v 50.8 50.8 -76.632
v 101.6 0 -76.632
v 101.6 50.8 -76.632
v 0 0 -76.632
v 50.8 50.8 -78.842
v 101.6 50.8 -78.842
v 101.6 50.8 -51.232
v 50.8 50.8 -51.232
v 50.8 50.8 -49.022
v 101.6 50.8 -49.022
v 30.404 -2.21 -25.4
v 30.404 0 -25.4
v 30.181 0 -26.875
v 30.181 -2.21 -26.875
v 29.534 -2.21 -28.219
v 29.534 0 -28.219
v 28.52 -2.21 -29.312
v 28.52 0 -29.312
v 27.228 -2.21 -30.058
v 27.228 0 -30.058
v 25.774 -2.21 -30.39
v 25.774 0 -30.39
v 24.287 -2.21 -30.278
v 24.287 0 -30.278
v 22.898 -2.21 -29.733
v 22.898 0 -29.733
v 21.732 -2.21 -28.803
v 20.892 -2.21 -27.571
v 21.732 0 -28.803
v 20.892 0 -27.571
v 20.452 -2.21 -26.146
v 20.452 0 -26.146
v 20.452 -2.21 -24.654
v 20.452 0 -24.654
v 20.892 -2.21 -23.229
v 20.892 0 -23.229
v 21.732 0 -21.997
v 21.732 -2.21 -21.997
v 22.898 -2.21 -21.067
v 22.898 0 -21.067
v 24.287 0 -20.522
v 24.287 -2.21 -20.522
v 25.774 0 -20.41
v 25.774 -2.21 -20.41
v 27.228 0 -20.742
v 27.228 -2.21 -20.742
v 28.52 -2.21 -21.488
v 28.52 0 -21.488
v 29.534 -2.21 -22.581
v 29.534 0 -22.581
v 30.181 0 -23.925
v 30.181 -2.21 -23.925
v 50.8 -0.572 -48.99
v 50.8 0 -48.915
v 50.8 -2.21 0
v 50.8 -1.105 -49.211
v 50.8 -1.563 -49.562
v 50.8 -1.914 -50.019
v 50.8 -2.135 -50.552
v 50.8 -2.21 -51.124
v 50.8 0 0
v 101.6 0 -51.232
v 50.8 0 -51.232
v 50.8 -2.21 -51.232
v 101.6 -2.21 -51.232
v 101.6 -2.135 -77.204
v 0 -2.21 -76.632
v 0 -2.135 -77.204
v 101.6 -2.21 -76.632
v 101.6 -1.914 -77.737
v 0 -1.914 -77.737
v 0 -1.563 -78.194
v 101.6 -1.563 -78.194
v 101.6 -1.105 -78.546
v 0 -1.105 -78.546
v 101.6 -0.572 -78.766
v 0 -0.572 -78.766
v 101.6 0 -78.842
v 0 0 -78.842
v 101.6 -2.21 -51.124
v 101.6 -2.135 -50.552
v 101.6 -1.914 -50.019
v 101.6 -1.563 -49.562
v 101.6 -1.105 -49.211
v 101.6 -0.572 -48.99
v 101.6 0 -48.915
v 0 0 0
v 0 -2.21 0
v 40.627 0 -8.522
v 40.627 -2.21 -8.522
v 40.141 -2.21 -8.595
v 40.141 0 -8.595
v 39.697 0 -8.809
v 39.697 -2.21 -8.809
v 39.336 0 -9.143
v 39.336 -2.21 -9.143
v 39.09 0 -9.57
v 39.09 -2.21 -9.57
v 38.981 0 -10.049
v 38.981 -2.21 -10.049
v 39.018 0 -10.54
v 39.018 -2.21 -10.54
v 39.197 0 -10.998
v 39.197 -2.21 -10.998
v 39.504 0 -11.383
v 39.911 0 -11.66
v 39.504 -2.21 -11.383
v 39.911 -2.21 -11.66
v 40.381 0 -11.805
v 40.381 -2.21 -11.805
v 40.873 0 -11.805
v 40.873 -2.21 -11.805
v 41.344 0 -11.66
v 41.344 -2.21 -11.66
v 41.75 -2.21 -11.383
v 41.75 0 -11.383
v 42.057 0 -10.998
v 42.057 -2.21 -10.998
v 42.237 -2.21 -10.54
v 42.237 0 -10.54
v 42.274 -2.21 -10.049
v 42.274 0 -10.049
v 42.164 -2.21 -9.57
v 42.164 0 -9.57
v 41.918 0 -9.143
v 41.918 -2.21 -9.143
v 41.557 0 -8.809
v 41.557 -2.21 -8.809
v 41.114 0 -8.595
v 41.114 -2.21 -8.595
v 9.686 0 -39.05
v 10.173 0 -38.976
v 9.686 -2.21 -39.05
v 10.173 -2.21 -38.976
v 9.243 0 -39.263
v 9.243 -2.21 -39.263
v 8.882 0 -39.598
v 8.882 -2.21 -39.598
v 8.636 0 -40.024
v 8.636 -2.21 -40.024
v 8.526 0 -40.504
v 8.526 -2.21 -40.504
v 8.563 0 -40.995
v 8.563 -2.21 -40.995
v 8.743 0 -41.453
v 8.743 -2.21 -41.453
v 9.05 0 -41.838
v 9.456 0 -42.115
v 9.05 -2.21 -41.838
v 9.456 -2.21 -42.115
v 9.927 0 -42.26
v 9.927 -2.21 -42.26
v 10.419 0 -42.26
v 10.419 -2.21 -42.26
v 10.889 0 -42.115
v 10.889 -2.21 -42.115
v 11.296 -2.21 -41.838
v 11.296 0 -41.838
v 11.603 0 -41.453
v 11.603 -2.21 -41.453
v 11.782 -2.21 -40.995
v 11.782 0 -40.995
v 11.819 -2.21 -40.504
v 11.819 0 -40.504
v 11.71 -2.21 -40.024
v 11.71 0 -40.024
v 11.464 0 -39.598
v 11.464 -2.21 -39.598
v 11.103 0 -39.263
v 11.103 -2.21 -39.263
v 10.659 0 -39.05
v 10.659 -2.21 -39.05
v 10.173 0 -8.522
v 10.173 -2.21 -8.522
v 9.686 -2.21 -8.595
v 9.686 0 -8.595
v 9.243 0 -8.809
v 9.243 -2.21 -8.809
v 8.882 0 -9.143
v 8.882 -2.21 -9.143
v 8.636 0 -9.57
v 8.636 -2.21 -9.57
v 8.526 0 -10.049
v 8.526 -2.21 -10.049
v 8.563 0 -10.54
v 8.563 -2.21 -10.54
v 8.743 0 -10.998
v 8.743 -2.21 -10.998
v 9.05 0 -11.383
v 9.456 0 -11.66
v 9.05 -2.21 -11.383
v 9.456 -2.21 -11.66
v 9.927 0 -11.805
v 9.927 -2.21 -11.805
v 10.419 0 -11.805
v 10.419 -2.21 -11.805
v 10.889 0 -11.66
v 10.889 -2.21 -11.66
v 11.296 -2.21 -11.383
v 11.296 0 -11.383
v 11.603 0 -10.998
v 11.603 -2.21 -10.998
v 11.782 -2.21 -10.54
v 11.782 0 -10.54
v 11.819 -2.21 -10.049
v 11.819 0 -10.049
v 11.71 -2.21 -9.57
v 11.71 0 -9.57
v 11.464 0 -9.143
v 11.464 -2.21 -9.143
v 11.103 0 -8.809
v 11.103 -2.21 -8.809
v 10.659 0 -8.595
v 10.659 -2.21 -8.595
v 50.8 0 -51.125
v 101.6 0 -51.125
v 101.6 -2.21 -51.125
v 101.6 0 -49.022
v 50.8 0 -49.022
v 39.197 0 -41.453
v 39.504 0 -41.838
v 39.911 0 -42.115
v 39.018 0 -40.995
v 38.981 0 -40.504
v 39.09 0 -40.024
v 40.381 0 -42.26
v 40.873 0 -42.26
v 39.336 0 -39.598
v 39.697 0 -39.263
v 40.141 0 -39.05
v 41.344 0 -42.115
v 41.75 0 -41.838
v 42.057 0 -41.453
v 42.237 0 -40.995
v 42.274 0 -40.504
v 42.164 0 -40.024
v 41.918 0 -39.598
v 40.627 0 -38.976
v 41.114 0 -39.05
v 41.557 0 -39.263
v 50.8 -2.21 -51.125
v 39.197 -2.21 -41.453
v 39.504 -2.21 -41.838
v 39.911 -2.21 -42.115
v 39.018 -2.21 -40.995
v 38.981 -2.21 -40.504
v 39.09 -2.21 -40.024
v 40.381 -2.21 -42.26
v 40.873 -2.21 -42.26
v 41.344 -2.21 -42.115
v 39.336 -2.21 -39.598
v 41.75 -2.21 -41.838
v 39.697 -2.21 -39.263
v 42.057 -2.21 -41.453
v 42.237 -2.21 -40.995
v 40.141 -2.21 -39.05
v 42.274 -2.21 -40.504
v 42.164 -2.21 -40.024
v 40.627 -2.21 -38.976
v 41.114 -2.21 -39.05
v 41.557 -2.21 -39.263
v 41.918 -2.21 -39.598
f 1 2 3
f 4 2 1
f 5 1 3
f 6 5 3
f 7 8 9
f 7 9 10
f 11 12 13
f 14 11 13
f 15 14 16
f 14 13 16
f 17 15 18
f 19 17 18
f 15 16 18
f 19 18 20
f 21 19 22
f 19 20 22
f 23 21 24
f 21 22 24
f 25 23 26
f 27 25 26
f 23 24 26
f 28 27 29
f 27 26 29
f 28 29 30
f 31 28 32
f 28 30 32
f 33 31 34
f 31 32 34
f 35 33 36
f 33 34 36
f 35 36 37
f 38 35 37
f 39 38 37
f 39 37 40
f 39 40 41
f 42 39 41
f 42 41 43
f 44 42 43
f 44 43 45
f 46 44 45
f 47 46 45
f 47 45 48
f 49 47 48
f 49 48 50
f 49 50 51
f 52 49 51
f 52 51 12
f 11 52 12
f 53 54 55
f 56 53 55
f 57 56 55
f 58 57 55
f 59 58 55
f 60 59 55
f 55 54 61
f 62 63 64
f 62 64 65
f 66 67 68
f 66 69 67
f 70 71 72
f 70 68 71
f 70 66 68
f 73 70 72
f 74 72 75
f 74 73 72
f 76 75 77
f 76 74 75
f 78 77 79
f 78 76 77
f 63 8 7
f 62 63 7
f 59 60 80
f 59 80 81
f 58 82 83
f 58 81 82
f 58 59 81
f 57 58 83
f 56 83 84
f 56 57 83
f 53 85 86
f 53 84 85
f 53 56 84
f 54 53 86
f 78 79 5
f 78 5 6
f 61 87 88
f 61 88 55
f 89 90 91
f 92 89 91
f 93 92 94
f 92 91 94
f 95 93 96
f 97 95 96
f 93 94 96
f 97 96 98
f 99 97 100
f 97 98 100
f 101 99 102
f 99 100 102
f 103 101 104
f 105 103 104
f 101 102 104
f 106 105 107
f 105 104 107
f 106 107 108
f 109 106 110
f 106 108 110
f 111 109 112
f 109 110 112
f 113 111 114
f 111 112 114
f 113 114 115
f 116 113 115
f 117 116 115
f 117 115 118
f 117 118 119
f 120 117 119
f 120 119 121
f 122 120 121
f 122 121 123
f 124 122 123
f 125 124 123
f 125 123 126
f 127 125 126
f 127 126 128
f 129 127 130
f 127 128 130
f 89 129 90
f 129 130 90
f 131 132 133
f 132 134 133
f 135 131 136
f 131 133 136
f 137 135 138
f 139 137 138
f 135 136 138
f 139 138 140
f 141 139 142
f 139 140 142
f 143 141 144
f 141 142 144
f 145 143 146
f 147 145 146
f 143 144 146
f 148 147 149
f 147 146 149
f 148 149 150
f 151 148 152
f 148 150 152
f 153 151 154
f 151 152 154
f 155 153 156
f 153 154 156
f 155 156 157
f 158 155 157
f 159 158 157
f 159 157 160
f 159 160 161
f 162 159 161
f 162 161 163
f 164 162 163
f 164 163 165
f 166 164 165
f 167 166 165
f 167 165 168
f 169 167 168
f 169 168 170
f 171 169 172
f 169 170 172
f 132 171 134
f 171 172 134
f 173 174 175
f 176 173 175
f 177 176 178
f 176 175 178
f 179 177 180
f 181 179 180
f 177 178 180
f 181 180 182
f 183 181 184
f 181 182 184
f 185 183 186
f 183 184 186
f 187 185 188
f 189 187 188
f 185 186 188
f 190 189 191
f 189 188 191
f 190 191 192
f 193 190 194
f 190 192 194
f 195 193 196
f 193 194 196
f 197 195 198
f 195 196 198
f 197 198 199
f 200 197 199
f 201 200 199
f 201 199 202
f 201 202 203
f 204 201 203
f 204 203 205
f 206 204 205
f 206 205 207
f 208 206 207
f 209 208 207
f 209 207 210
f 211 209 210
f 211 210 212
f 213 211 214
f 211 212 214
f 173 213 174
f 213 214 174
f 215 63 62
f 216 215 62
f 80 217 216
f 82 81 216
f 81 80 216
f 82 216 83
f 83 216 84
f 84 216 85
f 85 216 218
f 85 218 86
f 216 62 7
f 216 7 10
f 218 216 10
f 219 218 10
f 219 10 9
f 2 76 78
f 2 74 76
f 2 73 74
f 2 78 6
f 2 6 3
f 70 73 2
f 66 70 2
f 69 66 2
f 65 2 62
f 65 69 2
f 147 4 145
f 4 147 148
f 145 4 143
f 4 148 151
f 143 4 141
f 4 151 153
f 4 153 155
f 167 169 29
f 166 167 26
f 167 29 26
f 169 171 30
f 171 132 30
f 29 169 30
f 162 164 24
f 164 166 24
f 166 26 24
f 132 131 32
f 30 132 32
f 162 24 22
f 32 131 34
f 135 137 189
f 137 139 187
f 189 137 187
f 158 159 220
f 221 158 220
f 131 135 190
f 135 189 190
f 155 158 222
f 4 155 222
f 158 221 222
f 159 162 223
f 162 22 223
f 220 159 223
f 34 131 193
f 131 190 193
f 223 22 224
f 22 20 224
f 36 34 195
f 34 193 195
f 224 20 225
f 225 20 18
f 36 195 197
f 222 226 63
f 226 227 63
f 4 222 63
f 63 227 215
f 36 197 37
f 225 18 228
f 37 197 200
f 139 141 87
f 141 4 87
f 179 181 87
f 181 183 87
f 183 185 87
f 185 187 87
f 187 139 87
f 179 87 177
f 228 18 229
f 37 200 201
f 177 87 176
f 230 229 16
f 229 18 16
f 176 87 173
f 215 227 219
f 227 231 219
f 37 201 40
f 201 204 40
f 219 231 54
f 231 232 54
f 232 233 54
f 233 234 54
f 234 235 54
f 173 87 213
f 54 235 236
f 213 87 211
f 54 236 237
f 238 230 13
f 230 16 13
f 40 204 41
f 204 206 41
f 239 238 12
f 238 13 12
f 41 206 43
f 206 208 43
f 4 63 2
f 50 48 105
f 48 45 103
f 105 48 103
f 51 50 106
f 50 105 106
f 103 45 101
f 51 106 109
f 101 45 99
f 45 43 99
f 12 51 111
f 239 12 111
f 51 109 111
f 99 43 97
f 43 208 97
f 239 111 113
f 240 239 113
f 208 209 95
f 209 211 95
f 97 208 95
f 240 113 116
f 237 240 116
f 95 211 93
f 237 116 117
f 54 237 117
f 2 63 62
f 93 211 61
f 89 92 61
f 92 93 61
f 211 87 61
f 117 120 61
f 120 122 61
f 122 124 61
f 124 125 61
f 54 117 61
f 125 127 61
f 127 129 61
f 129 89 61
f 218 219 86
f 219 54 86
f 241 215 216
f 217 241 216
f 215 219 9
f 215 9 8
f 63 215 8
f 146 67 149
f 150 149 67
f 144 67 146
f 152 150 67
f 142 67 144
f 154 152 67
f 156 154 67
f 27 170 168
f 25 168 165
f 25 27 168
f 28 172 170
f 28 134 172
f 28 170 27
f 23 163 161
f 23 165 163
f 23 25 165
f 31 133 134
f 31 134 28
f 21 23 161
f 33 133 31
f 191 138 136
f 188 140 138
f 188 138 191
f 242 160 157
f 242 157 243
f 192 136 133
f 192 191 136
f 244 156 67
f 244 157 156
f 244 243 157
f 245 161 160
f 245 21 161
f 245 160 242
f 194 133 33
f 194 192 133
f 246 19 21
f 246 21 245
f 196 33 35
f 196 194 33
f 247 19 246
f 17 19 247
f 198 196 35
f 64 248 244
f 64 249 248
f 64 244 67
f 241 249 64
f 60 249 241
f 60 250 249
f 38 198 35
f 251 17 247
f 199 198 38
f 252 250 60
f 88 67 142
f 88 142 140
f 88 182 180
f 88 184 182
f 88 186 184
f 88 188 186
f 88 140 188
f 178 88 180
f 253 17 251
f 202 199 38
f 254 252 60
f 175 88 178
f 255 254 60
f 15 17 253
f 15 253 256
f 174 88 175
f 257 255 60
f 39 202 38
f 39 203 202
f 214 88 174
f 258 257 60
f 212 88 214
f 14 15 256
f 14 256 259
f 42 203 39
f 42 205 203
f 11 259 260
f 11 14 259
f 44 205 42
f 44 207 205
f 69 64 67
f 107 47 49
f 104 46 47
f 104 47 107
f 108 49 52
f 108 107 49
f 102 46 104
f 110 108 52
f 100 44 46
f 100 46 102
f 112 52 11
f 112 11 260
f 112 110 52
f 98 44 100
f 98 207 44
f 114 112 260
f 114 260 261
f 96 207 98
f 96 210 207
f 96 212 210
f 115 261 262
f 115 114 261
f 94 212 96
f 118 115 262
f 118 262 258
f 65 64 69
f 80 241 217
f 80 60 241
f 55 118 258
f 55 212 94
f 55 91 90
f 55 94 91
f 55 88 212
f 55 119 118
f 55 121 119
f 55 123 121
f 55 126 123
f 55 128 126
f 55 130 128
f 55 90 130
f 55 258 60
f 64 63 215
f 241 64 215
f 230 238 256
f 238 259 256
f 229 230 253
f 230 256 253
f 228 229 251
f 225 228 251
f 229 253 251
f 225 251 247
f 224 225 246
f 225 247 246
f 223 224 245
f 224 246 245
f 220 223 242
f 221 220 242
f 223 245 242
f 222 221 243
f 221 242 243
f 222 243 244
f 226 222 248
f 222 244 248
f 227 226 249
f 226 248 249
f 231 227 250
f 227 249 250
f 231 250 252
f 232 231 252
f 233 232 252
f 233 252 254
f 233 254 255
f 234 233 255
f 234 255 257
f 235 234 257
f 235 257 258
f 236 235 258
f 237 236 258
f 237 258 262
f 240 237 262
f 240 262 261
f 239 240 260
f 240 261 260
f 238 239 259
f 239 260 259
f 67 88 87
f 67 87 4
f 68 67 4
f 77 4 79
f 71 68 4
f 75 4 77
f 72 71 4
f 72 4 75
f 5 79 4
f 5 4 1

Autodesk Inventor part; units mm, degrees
ref_plane "YZ Plane" through (0, 0, 0) normal (1, 0, 0) x (0, 1, 0)
ref_plane "XZ Plane" through (0, 0, 0) normal (0, 1, 0) x (-1, 0, 0)
ref_plane "XY Plane" through (0, 0, 0) normal (0, 0, 1) x (1, 0, 0)
sketch "Sketch1" plane through (0, 0, 0) normal (0, 1, 0) x (-1, 0, 0)
  line L0 (0, 0) -> (-50.8, 0)
  line L1 (-50.8, 0) -> (-50.8, -50.8)
  line L2 (-50.8, -50.8) -> (0, -50.8)
  line L3 (0, -50.8) -> (0, 0)
  line L4 (-50.8, 0) -> (-101.6, 0)
  line L5 (-101.6, 0) -> (-101.6, -25.4)
  line L6 (-101.6, -25.4) -> (-50.8, -25.4)
  line L7 (-50.8, -25.4) -> (-50.8, 0)
  line L8 (-50.8, 0) -> (-101.6, 0)
  line L9 (-101.6, 0) -> (-101.6, 2.2098)
  line L10 (-101.6, 2.2098) -> (-50.8, 2.2098)
  line L11 (-50.8, 2.2098) -> (-50.8, 0)
  dimension "d0" = 50.8
  dimension "d1" = 50.8
  dimension "d2" = 50.8
  dimension "d3" = 2.2098
extrude "Extrusion1" add sketch "Sketch1" against normal blind 2.2098
extrude "Extrusion2" add sketch "Sketch1" along normal blind 50.8 contours L4 L9 L10 L11
fillet "Fillet1" radius 2.2098 1 edges at (76.2, -2.2098, 2.2098)
sketch "Sketch2" plane through (0, 0, 0) normal (0, 1, 0) x (1, 0, 0)
  line L0 (50.8, 0) -> (101.6, 0) projected
  line L1 (101.6, 0) -> (101.6, 25.4) projected
  line L2 (101.6, 25.4) -> (50.8, 25.4) projected
  line L3 (50.8, 25.4) -> (50.8, 50.8) projected
  line L4 (50.8, 50.8) -> (0, 50.8) projected
  line L5 (0, 50.8) -> (0, 0) projected
  line L6 (0, 0) -> (50.8, 0) projected
  line L7 (10.1727, 10.1727) -> (40.6273, 10.1727)
  line L8 (40.6273, 10.1727) -> (40.6273, 40.6273)
  line L9 (40.6273, 40.6273) -> (10.1727, 40.6273)
  line L10 (10.1727, 40.6273) -> (10.1727, 10.1727)
  dimension "d9" = 30.4546
  dimension "d10" = 30.4546
hole "Hole1" at (10.1727, 0, -40.6273) at (10.1727, 0, -10.1727) at (40.6273, 0, -40.6273) at (40.6273, 0, -10.1727) direction (0, -1, 0) diameter 3.302 end through all
sketch "Sketch3" plane through (0, 0, 0) normal (0, 1, 0) x (1, 0, 0)
  line L0 (50.8, 0) -> (101.6, 0)
  line L1 (101.6, 0) -> (101.6, 33.655)
  line L2 (101.6, 33.655) -> (50.8, 33.655)
  line L3 (50.8, 33.655) -> (50.8, 0)
  line L4 (50.8, 33.655) -> (101.6, 33.655)
  line L5 (101.6, 33.655) -> (101.6, 59.055)
  line L6 (101.6, 59.055) -> (50.8, 59.055)
  line L7 (50.8, 59.055) -> (50.8, 33.655)
  point P0 (0, 0)
  dimension "d18" = 33.655
  dimension "d19" = 25.4
extrude "Extrusion3" cut sketch "Sketch3" against normal blind 25.4 contours L3 L2 L1 L0
extrude "Extrusion4" add sketch "Sketch3" against normal blind 2.2098 contours L7 L6 L5 L2
sketch "Sketch4" plane through (0, 50.8, 0) normal (0, 1, 0) x (1, 0, 0)
  point P0 (0, 0)
sketch "Sketch5" plane through (0, 50.8, 0) normal (0, 1, 0) x (1, 0, 0)
  line L0 (50.8, 0) -> (101.6, 0)
  line L1 (101.6, 0) -> (101.6, -2.2098)
  line L2 (101.6, -2.2098) -> (50.8, -2.2098)
  line L3 (50.8, -2.2098) -> (50.8, 0)
  point P0 (0, 0)
extrude "Extrusion5" cut sketch "Sketch5" against normal through all
sketch "Sketch7" plane through (0, -2.2098, 0) normal (0, -1, 0) x (1, 0, 0)
  line L0 (50.8, -33.655) -> (101.6, -33.655)
  line L1 (101.6, -33.655) -> (101.6, -31.4452)
  line L2 (101.6, -31.4452) -> (50.8, -31.4452)
  line L3 (50.8, -31.4452) -> (50.8, -33.655)
  point P0 (0, 0)
  dimension "d27" = 50.8
  dimension "d28" = 2.2098
extrude "Extrusion6" add sketch "Sketch7" against normal blind 53.0098
fillet "Fillet2" radius 2.2098 1 edges at (76.2, -2.2098, -31.4452)
sketch "Sketch8" plane through (0, 0, 0) normal (0, 1, 0) x (1, 0, 0)
  line L0 (50.8, 0) -> (50.8, 31.4452) projected
  line L1 (50.8, 31.4452) -> (50.8, 33.655) projected
  line L2 (50.8, 33.655) -> (101.6, 33.655) projected
  line L3 (101.6, 33.655) -> (101.6, 59.055) projected
  line L4 (101.6, 59.055) -> (50.8, 59.055) projected
  line L5 (50.8, 59.055) -> (50.8, 50.8) projected
  line L6 (50.8, 50.8) -> (0, 50.8) projected
  line L7 (0, 50.8) -> (0, 0) projected
  line L8 (0, 0) -> (50.8, 0) projected
  circle A0 centre (40.6273, 10.1727) radius 1.651 projected
  circle A1 centre (10.1727, 10.1727) radius 1.651 projected
  circle A2 centre (10.1727, 40.6273) radius 1.651 projected
  circle A3 centre (40.6273, 40.6273) radius 1.651 projected
  line L9 (50.8, 59.055) -> (101.6, 59.055)
  line L10 (101.6, 59.055) -> (101.6, 76.6318)
  line L11 (101.6, 76.6318) -> (50.8, 76.6318)
  line L12 (50.8, 76.6318) -> (50.8, 59.055)
  line L13 (50.8, 50.8) -> (0, 50.8)
  line L14 (0, 50.8) -> (0, 76.6318)
  line L15 (0, 76.6318) -> (50.8, 76.6318)
  line L16 (50.8, 76.6318) -> (50.8, 50.8)
  dimension "d32" = 17.5768
extrude "Extrusion7" add sketch "Sketch8" against normal blind 2.2098 contours L14 L15 L12 L5 L6 | L4 L12 L11 L10
sketch "Sketch9" plane through (0, 0, 0) normal (0, 1, 0) x (1, 0, 0)
  line L0 (101.6, 76.6318) -> (50.8, 76.6318)
  line L1 (50.8, 76.6318) -> (50.8, 51.2318)
  line L2 (50.8, 51.2318) -> (101.6, 51.2318)
  line L3 (101.6, 51.2318) -> (101.6, 76.6318)
  line L4 (50.8, 51.2318) -> (112.668, 51.2318)
  line L5 (112.668, 51.2318) -> (112.668, 0)
  line L6 (112.668, 0) -> (50.8, 0)
  line L7 (50.8, 0) -> (50.8, 51.2318)
  point P0 (0, 0)
  dimension "d35" = 25.4
extrude "Extrusion8" cut sketch "Sketch9" against normal blind 2.2098 contours L4 L5 L6 L7 L2
sketch "Sketch10" plane through (0, 50.8, 0) normal (0, 1, 0) x (1, 0, 0)
  line L0 (50.8, 33.655) -> (116.0287, 33.655)
  line L1 (116.0287, 33.655) -> (116.0287, 19.3076)
  line L2 (116.0287, 19.3076) -> (50.8, 19.3076)
  line L3 (50.8, 19.3076) -> (50.8, 33.655)
  point P0 (0, 0)
extrude "Extrusion9" cut sketch "Sketch10" against normal through all
sketch "Sketch11" plane through (0, 0, 0) normal (0, 1, 0) x (1, 0, 0)
  line L0 (50.8, 51.2318) -> (101.6, 51.2318) projected
  line L1 (101.6, 51.2318) -> (101.6, 76.6318) projected
  line L2 (101.6, 76.6318) -> (0, 76.6318) projected
  line L3 (0, 76.6318) -> (0, 0) projected
  line L4 (0, 0) -> (50.8, 0) projected
  line L5 (50.8, 0) -> (50.8, 51.2318) projected
  circle A0 centre (40.6273, 10.1727) radius 1.651 projected
  circle A1 centre (10.1727, 10.1727) radius 1.651 projected
  circle A2 centre (10.1727, 40.6273) radius 1.651 projected
  circle A3 centre (40.6273, 40.6273) radius 1.651 projected
  line L6 (50.8, 51.2318) -> (101.6, 51.2318)
  line L7 (101.6, 51.2318) -> (101.6, 49.022)
  line L8 (101.6, 49.022) -> (50.8, 49.022)
  line L9 (50.8, 49.022) -> (50.8, 51.2318)
  dimension "d40" = 2.2098
extrude "Extrusion10" add sketch "Sketch11" along normal blind 50.8 contours L0 L7 L8 L5
sketch "Sketch12" plane through (0, 0, 0) normal (0, -1, 0) x (1, 0, 0)
  line L0 (50.8, -51.2318) -> (50.8, -49.022) projected
  line L1 (101.6, -48.9148) -> (50.8, -48.9148)
  line L2 (50.8, -48.9148) -> (50.8, -51.1246)
  line L3 (50.8, -51.1246) -> (101.6, -51.1246)
  line L4 (101.6, -51.1246) -> (101.6, -48.9148)
  point P0 (0, 0)
  dimension "d43" = 2.2098
extrude "Extrusion11" add sketch "Sketch12" along normal blind 2.2098
fillet "Fillet3" radius 2.2098 1 edges at (76.2, -2.2098, -48.9148)
sketch "Sketch14" plane through (0, -2.2098, 0) normal (0, -1, 0) x (1, 0, 0)
  line L0 (101.6, -76.6318) -> (0, -76.6318)
  line L1 (0, -76.6318) -> (0, -78.8416)
  line L2 (0, -78.8416) -> (101.6, -78.8416)
  line L3 (101.6, -78.8416) -> (101.6, -76.6318)
  point P0 (0, 0)
  dimension "d47" = 2.2098
extrude "Extrusion12" add sketch "Sketch14" against normal blind 53.0098
sketch "Sketch15" plane through (101.6, -2.2098, -78.8416) normal (0, 0, -1) x (-1, 0, 0)
  line L0 (101.6, 53.0098) -> (0, 53.0098) projected
  line L1 (101.6, 2.2098) -> (50.8, 53.0098)
  line L2 (101.6, 2.2098) -> (101.6, 53.0098)
  line L3 (101.6, 2.2098) -> (101.6, 53.0098) projected
  line L4 (101.6, 53.0098) -> (50.8, 53.0098)
  dimension "d50" = 50.8
extrude "Extrusion13" cut sketch "Sketch15" against normal blind 2.2098
fillet "Fillet4" radius 2.2098 1 edges at (50.8, -2.2098, -78.8416)
sketch "Sketch16" plane through (0, 0, 0) normal (0, 1, 0) x (1, 0, 0)
  line L0 (0, 0) -> (50.8, 0)
  line L1 (50.8, 0) -> (50.8, 50.8)
  line L2 (50.8, 50.8) -> (0, 50.8)
  line L3 (0, 50.8) -> (0, 0)
  circle A0 centre (25.4, 25.4) radius 5.0038
  dimension "d54" = 50.8
  dimension "d55" = 10.0076
extrude "Extrusion14" cut sketch "Sketch16" against normal blind 3.175 contours A0
properties part number "Arm holder Bracket"
